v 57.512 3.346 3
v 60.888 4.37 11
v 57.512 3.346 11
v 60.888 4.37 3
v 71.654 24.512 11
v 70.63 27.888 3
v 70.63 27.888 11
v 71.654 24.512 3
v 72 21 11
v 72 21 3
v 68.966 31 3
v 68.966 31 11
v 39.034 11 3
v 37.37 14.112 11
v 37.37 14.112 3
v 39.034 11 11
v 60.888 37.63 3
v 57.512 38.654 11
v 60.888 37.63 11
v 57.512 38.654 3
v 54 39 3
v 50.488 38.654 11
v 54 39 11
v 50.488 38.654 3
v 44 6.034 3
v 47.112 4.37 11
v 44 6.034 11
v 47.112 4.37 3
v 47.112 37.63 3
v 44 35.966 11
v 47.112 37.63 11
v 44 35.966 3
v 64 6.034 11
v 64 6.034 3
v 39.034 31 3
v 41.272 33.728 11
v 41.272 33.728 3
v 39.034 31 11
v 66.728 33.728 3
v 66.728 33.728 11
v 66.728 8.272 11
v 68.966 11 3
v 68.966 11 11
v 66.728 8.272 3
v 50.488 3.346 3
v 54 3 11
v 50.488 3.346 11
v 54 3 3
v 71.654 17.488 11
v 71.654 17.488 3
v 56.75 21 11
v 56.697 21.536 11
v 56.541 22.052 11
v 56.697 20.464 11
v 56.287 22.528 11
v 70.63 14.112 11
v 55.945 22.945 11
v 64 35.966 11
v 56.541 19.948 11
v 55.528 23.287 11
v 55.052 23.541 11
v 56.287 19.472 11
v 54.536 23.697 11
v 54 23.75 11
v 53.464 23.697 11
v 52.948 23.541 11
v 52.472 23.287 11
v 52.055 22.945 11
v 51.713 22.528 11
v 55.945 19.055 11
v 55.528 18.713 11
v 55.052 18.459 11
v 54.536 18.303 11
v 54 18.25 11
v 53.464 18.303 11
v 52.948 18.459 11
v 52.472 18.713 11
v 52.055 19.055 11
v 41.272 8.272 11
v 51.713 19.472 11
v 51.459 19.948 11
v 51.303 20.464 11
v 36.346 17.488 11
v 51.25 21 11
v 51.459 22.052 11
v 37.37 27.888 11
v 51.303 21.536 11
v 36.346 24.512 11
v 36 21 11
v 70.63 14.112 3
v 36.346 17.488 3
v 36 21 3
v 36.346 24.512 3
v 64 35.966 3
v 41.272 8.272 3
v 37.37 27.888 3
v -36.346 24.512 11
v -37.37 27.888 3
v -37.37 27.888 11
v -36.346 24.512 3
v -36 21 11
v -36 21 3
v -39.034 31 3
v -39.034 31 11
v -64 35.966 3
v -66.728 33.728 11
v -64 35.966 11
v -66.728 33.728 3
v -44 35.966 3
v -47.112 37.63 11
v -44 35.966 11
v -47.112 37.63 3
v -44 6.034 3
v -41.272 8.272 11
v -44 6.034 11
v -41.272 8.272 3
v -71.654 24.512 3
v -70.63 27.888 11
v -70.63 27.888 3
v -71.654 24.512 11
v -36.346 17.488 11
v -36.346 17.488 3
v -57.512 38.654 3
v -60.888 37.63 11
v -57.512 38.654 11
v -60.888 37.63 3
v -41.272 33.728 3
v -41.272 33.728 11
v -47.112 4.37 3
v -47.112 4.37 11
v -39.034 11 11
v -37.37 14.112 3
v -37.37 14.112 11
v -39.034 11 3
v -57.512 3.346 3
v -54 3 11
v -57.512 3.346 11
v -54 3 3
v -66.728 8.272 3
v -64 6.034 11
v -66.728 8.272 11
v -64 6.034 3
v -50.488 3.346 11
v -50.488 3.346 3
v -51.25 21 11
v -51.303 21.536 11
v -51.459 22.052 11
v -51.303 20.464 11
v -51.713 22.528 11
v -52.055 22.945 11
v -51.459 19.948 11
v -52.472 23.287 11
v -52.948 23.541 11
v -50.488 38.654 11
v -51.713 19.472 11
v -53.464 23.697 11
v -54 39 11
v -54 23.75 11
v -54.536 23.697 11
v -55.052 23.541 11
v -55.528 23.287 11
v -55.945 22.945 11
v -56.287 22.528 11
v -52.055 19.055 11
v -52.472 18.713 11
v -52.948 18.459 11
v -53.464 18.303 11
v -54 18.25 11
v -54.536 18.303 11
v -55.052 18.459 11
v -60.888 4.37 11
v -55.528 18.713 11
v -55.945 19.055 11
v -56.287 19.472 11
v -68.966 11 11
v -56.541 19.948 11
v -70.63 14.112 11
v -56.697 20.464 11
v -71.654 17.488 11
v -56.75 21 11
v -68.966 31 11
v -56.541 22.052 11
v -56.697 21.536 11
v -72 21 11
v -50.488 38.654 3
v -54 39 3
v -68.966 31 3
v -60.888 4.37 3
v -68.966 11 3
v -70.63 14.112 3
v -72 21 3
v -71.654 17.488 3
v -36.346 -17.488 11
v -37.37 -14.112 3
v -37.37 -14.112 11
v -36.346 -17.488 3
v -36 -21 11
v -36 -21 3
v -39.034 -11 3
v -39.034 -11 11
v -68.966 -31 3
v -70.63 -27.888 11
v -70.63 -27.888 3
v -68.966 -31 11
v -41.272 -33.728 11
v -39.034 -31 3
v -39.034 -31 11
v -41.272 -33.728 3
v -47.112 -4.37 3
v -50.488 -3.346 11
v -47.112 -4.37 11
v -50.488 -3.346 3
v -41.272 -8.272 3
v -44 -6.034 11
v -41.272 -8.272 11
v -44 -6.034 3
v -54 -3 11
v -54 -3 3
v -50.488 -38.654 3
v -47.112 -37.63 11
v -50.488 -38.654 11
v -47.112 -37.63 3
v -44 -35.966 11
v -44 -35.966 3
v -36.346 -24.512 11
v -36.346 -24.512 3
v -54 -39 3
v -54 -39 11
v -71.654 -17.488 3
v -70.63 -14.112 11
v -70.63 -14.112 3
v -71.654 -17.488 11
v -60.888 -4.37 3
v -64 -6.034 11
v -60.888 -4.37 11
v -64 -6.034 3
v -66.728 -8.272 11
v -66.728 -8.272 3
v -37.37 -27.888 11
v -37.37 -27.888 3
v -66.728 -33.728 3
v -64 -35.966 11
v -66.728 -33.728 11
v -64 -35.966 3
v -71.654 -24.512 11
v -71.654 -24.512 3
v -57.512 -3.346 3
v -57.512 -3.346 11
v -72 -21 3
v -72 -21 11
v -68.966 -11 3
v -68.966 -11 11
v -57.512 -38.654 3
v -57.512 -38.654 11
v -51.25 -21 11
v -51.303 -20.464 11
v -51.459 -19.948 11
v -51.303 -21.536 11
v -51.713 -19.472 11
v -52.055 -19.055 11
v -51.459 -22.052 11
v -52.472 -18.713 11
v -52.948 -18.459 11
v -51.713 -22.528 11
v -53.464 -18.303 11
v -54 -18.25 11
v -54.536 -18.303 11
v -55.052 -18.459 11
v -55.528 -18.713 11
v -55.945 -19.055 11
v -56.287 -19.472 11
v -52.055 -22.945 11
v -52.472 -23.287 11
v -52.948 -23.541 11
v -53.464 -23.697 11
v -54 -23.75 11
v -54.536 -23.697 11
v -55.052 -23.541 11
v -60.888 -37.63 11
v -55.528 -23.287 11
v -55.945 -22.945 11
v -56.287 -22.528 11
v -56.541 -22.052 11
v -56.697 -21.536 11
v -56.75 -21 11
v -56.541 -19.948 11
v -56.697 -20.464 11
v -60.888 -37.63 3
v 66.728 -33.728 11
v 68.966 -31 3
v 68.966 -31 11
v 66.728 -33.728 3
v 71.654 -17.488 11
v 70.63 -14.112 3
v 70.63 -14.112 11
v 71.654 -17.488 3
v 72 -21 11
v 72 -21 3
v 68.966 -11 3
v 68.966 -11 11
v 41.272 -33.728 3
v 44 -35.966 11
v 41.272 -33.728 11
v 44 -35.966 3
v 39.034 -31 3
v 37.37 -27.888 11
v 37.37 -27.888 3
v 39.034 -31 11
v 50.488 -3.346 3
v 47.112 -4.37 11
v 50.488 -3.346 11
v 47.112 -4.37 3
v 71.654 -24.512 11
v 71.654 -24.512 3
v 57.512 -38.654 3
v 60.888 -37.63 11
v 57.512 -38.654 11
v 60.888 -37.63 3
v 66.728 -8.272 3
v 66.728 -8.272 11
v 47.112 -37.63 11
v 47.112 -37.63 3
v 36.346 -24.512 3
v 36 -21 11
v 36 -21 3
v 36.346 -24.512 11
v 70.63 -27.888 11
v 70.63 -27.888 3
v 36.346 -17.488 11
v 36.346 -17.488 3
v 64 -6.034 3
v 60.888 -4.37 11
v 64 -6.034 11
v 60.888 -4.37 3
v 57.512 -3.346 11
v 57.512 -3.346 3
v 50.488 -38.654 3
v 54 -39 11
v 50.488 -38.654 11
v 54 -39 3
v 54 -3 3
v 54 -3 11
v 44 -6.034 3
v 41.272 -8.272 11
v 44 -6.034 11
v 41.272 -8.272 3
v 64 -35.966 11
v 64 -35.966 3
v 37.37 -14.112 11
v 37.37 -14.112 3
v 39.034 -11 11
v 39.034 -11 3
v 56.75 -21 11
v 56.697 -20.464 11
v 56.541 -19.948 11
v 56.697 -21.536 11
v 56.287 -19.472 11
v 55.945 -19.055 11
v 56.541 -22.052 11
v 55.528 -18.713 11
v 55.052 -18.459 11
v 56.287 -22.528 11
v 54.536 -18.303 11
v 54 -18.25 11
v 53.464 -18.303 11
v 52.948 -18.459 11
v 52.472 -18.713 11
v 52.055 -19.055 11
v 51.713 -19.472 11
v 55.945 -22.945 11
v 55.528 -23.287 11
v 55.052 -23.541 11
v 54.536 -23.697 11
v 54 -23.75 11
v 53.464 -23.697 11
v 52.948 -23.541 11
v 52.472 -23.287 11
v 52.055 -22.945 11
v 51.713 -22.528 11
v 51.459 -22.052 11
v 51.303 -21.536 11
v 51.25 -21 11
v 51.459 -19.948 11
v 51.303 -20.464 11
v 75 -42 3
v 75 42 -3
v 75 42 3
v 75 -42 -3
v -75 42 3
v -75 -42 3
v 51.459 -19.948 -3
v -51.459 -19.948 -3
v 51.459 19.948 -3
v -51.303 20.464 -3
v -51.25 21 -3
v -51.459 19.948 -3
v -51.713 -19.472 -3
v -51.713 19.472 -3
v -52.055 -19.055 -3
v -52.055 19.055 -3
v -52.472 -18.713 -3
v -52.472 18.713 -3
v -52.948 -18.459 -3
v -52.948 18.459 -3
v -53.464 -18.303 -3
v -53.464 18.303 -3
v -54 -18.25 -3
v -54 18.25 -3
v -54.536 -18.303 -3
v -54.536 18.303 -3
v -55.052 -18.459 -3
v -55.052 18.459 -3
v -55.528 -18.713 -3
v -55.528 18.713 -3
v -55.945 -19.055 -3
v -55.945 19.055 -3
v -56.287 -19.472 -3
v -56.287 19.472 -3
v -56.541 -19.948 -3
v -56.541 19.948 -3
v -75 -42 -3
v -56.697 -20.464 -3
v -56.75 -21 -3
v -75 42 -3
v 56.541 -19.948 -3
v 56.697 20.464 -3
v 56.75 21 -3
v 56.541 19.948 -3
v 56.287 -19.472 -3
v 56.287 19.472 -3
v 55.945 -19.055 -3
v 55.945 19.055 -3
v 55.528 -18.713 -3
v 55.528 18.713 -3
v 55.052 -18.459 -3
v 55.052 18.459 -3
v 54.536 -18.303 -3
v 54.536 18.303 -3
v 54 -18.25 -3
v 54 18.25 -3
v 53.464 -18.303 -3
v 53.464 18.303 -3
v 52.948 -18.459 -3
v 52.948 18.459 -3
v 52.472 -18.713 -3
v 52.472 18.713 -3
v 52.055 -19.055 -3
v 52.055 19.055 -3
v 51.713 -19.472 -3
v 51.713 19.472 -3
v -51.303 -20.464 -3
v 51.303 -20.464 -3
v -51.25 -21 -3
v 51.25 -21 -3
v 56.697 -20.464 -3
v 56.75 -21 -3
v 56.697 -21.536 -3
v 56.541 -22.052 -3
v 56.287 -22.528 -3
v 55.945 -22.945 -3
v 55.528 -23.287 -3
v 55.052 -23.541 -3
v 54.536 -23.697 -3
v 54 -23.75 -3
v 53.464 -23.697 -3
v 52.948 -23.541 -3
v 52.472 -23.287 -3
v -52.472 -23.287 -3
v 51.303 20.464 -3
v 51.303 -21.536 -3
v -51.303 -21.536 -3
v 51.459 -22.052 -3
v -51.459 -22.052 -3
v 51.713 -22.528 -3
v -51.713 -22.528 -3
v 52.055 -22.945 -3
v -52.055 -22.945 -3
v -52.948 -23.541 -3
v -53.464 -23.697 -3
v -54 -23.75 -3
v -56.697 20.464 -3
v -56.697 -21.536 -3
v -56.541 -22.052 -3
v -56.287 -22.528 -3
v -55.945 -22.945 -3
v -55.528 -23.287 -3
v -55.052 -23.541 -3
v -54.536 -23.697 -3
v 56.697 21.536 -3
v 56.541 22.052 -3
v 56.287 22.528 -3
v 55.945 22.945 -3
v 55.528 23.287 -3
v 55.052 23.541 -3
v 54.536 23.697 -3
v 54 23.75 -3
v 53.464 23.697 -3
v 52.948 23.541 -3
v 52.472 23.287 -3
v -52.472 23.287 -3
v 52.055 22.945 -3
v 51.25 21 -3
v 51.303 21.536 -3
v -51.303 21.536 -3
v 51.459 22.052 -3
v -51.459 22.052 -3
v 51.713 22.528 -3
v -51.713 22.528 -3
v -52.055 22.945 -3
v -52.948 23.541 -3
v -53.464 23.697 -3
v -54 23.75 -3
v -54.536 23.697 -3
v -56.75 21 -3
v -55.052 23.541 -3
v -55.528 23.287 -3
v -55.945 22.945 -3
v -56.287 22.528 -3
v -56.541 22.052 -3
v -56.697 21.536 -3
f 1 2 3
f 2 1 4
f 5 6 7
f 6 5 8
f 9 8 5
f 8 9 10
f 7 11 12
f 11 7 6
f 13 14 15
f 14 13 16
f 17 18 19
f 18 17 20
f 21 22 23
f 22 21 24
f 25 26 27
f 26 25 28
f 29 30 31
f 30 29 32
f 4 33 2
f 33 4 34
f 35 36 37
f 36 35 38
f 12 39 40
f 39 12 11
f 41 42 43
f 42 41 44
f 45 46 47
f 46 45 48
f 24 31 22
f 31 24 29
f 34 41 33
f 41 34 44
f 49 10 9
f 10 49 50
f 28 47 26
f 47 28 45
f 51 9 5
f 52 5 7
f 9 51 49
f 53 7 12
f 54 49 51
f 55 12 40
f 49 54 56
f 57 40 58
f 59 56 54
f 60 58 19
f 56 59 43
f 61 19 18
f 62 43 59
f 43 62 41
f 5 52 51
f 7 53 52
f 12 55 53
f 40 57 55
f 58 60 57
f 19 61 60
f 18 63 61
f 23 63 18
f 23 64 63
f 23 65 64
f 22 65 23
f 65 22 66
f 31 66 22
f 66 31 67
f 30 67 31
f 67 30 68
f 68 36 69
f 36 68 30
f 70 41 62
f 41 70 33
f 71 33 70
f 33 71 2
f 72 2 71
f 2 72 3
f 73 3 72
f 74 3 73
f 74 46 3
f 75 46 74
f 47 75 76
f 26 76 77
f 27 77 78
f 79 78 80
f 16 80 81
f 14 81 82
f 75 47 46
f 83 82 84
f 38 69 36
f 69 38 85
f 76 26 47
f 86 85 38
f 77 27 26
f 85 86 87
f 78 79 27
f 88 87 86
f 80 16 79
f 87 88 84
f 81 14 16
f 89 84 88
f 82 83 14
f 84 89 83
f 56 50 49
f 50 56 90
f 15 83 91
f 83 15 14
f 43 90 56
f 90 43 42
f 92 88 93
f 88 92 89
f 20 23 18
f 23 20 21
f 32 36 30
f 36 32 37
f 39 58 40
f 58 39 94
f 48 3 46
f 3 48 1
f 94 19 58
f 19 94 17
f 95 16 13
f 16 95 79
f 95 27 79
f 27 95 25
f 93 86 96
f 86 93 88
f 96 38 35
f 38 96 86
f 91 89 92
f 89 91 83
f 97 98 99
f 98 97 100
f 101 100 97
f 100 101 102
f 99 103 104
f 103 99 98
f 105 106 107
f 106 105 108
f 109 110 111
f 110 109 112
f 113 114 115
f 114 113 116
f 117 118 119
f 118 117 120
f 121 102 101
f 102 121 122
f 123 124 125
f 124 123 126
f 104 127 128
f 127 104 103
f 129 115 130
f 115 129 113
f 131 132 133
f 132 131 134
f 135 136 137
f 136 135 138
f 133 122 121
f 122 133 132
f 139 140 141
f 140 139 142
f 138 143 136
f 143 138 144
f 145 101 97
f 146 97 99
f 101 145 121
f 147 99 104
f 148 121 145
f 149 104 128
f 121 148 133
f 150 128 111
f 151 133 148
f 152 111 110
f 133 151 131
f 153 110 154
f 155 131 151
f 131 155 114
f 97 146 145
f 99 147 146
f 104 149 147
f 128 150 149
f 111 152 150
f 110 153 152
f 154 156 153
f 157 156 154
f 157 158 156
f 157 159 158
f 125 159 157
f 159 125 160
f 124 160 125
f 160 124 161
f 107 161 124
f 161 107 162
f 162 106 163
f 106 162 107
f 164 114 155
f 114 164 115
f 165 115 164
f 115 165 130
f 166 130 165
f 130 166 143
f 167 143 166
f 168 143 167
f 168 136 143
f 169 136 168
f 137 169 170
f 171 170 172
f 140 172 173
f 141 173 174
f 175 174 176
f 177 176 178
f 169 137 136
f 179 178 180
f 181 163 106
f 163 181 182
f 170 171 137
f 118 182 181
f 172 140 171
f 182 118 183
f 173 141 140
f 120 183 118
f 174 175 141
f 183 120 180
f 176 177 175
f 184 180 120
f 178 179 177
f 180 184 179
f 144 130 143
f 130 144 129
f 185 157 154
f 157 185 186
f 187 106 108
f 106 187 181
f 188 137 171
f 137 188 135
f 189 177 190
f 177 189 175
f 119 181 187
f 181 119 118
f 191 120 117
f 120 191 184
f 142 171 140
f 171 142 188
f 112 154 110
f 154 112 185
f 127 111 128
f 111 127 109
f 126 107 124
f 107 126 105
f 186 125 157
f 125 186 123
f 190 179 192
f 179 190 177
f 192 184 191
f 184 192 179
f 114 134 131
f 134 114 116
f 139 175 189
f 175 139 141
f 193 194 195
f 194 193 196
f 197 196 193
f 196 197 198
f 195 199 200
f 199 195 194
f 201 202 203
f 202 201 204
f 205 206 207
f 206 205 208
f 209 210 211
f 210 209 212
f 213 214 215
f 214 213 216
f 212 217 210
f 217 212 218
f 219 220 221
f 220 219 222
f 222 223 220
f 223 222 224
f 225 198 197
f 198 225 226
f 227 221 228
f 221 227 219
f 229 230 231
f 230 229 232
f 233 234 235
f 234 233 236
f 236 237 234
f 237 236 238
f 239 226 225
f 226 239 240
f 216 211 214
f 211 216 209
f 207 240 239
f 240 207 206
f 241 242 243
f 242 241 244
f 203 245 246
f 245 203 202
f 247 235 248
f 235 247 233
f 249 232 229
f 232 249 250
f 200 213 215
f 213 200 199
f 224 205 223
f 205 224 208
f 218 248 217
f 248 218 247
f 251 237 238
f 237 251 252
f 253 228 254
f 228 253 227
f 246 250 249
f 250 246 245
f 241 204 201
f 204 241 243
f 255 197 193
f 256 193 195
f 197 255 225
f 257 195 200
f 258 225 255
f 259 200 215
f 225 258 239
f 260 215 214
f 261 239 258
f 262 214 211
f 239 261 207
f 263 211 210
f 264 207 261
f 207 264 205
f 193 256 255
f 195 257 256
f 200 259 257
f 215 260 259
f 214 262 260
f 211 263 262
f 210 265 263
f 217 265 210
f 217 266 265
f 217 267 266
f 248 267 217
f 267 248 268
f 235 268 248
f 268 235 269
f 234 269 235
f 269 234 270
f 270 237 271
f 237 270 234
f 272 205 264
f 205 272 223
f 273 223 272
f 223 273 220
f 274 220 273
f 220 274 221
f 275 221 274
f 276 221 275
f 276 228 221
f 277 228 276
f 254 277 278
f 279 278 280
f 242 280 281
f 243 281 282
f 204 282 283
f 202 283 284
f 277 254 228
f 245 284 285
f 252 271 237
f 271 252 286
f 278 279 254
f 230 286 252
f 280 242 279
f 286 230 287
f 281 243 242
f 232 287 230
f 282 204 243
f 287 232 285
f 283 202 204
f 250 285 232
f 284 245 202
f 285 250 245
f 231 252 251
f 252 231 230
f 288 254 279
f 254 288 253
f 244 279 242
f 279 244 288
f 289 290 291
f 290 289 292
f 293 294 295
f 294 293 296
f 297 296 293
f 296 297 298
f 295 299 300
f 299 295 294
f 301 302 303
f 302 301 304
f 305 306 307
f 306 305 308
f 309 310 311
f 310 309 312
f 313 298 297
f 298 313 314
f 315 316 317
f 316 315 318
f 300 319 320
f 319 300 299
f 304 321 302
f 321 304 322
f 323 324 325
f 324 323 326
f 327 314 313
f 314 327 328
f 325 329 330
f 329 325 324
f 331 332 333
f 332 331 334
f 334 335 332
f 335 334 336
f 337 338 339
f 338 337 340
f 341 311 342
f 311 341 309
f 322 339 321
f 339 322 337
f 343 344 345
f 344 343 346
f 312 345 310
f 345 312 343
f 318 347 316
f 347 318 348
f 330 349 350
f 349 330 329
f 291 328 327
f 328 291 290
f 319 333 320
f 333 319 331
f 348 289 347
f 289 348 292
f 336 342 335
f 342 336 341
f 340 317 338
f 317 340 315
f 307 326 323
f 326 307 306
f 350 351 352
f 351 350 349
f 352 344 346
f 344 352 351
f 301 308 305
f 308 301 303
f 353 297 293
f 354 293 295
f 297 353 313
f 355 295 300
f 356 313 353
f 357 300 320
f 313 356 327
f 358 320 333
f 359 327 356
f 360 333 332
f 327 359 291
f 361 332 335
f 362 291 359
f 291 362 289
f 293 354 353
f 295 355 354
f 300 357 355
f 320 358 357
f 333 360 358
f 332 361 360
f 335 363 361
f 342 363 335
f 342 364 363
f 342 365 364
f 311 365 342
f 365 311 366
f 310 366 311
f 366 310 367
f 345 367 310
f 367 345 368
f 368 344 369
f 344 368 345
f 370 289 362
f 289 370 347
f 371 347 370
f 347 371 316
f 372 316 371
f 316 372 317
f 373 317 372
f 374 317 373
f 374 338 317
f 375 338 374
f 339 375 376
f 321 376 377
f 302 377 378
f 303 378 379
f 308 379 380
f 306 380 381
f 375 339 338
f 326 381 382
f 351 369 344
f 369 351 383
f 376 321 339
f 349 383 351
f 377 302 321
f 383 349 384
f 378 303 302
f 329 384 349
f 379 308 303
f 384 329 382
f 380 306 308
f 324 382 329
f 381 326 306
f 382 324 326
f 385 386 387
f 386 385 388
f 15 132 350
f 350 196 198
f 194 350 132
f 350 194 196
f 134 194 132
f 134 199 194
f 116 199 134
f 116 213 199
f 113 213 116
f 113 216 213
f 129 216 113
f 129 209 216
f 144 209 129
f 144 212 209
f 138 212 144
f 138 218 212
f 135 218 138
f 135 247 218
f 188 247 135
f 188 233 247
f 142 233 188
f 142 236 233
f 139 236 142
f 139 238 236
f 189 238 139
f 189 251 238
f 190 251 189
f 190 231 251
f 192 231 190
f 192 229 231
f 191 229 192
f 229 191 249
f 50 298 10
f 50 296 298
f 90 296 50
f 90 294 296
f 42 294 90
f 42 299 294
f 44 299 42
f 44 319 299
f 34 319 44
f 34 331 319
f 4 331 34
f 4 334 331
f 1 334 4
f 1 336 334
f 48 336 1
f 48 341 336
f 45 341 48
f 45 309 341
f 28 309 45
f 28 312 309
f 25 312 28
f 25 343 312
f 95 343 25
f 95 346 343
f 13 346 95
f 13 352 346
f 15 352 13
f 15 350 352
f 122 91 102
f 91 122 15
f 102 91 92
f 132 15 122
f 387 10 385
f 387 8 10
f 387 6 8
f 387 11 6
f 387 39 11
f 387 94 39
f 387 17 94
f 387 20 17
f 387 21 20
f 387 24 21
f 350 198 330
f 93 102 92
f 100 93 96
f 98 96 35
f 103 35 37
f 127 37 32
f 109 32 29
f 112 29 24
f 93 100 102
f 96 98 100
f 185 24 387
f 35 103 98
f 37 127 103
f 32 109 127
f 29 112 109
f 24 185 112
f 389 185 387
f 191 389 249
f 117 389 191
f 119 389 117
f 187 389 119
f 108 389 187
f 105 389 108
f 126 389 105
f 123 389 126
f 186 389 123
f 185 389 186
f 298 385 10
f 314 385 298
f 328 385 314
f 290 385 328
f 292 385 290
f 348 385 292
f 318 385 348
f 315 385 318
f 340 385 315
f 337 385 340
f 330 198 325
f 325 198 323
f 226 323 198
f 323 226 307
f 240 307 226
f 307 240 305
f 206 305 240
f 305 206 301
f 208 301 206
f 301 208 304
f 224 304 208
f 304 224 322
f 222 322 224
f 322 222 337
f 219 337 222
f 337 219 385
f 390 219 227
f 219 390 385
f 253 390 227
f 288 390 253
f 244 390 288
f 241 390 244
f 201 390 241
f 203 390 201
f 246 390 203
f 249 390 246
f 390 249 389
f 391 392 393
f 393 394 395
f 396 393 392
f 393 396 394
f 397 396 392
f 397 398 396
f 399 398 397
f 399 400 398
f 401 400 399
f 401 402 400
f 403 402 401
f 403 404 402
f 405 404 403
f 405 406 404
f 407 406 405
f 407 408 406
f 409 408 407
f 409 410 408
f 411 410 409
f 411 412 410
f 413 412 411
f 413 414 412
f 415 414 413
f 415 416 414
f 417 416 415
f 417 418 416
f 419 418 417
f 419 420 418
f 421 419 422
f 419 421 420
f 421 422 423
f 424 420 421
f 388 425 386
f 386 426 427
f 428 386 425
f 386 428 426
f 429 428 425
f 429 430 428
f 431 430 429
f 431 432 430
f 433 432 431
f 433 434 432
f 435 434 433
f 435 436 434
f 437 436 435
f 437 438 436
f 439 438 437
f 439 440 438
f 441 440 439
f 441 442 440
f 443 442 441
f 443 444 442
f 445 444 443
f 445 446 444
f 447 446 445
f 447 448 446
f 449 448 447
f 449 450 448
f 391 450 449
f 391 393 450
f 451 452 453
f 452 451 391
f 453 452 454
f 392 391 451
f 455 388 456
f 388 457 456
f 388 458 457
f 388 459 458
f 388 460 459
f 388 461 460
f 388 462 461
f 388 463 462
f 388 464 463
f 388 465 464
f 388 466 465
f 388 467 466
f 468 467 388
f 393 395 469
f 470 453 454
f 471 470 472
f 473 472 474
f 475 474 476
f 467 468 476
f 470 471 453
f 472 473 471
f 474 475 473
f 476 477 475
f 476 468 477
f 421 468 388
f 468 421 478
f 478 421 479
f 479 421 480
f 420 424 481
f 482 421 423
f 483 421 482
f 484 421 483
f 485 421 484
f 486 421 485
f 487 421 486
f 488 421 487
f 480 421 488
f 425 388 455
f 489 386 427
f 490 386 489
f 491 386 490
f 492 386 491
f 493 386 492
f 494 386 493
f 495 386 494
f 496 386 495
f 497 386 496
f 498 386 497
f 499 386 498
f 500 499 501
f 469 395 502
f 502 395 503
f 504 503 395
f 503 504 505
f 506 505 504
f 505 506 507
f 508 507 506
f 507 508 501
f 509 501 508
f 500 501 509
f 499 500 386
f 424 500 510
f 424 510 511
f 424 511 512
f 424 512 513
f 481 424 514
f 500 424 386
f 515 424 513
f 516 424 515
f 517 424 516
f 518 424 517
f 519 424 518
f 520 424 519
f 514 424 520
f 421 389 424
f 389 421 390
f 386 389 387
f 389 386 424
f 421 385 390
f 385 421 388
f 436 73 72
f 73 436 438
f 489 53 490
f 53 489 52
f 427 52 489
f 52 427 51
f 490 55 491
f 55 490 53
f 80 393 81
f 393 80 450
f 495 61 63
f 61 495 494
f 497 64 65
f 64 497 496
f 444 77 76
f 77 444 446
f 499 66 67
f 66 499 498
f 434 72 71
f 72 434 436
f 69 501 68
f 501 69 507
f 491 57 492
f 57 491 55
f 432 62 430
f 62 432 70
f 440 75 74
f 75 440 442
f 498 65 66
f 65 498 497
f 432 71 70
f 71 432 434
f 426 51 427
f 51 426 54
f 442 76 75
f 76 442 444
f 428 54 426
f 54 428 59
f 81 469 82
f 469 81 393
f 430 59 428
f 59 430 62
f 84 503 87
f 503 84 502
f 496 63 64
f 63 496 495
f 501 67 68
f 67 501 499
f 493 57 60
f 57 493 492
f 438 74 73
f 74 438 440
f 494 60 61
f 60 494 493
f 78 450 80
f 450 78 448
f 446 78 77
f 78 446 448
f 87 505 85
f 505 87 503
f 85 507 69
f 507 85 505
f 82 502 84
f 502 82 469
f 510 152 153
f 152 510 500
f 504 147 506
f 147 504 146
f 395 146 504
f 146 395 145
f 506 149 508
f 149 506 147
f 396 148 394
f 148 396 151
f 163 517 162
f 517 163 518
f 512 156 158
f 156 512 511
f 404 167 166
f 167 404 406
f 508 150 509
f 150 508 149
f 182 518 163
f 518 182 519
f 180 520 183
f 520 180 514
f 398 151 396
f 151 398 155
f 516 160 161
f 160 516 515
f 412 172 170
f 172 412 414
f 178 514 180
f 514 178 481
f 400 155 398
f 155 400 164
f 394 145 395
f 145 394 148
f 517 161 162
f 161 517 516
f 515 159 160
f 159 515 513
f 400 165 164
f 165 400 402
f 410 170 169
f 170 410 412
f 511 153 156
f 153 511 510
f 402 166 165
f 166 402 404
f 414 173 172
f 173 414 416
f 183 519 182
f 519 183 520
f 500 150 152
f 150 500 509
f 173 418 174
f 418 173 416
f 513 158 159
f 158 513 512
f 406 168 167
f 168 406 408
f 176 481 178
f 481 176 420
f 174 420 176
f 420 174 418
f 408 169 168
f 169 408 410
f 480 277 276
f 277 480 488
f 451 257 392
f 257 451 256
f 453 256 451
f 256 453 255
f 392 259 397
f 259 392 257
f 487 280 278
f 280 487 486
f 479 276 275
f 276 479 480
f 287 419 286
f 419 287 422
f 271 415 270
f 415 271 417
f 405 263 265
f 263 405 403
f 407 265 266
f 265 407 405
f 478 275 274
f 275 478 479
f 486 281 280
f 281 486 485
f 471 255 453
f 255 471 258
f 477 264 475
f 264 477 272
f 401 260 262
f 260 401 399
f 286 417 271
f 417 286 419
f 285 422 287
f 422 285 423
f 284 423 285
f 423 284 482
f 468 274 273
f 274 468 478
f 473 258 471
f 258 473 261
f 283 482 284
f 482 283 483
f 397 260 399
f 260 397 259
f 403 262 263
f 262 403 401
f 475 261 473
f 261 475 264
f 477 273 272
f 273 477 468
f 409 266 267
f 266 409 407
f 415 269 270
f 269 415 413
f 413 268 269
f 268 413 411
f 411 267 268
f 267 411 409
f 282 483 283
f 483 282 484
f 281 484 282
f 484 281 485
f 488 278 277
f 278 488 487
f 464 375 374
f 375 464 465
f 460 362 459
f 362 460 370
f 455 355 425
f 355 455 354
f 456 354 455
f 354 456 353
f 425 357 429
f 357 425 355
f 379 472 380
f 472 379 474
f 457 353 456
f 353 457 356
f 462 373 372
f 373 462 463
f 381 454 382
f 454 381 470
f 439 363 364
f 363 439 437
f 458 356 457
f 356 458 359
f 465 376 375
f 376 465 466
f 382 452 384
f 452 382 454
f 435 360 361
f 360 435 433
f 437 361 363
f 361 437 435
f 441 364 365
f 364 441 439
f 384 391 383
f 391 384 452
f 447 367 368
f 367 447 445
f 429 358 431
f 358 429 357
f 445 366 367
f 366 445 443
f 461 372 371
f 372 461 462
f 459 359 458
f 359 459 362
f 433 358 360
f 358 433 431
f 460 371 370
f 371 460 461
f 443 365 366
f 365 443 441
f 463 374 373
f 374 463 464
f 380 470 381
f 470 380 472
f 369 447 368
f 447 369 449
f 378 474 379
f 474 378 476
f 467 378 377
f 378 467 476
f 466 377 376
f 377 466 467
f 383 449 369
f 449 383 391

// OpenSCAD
$fn = 32;

// ----------------------------------------------------------------------
// Anchor pads 150 x 84 x 14
// four corner bosses with anchor holes
// ----------------------------------------------------------------------

// --- parameters (mm) ---
plate = [150, 84, 6];  // base plate size (x, y, z)
pads = 4;              // boss count, one per corner
edge = 21;             // boss centre offset from the plate edge
boss_d = 36;           // boss diameter
boss_h = 8;            // boss height above the base plate
hole_d = 5.5;          // hole diameter

// --- derived feature positions (mm) ---
height = plate[2] + boss_h;      // = 14   overall height of the part
corner_x = plate[0] / 2 - edge;  // = 54   boss centre X
corner_y = plate[1] / 2 - edge;  // = 21   boss centre Y
feature_centers = [
  [corner_x, corner_y],
  [-corner_x, corner_y],
  [-corner_x, -corner_y],
  [corner_x, -corner_y]
];   // boss centres, anchor holes are drilled there

// base plate, four bosses standing on it, anchor holes all the way through
difference() {
  union() {
    cube(plate, center = true);
    for (centre = feature_centers)
      translate([centre[0], centre[1], plate[2] / 2 - 1])
        cylinder(d = boss_d, h = boss_h + 1);
  }
  for (centre = feature_centers)
    translate([centre[0], centre[1], -height])
      cylinder(d = hole_d, h = 2 * height + 2);  // through boss and plate
}
